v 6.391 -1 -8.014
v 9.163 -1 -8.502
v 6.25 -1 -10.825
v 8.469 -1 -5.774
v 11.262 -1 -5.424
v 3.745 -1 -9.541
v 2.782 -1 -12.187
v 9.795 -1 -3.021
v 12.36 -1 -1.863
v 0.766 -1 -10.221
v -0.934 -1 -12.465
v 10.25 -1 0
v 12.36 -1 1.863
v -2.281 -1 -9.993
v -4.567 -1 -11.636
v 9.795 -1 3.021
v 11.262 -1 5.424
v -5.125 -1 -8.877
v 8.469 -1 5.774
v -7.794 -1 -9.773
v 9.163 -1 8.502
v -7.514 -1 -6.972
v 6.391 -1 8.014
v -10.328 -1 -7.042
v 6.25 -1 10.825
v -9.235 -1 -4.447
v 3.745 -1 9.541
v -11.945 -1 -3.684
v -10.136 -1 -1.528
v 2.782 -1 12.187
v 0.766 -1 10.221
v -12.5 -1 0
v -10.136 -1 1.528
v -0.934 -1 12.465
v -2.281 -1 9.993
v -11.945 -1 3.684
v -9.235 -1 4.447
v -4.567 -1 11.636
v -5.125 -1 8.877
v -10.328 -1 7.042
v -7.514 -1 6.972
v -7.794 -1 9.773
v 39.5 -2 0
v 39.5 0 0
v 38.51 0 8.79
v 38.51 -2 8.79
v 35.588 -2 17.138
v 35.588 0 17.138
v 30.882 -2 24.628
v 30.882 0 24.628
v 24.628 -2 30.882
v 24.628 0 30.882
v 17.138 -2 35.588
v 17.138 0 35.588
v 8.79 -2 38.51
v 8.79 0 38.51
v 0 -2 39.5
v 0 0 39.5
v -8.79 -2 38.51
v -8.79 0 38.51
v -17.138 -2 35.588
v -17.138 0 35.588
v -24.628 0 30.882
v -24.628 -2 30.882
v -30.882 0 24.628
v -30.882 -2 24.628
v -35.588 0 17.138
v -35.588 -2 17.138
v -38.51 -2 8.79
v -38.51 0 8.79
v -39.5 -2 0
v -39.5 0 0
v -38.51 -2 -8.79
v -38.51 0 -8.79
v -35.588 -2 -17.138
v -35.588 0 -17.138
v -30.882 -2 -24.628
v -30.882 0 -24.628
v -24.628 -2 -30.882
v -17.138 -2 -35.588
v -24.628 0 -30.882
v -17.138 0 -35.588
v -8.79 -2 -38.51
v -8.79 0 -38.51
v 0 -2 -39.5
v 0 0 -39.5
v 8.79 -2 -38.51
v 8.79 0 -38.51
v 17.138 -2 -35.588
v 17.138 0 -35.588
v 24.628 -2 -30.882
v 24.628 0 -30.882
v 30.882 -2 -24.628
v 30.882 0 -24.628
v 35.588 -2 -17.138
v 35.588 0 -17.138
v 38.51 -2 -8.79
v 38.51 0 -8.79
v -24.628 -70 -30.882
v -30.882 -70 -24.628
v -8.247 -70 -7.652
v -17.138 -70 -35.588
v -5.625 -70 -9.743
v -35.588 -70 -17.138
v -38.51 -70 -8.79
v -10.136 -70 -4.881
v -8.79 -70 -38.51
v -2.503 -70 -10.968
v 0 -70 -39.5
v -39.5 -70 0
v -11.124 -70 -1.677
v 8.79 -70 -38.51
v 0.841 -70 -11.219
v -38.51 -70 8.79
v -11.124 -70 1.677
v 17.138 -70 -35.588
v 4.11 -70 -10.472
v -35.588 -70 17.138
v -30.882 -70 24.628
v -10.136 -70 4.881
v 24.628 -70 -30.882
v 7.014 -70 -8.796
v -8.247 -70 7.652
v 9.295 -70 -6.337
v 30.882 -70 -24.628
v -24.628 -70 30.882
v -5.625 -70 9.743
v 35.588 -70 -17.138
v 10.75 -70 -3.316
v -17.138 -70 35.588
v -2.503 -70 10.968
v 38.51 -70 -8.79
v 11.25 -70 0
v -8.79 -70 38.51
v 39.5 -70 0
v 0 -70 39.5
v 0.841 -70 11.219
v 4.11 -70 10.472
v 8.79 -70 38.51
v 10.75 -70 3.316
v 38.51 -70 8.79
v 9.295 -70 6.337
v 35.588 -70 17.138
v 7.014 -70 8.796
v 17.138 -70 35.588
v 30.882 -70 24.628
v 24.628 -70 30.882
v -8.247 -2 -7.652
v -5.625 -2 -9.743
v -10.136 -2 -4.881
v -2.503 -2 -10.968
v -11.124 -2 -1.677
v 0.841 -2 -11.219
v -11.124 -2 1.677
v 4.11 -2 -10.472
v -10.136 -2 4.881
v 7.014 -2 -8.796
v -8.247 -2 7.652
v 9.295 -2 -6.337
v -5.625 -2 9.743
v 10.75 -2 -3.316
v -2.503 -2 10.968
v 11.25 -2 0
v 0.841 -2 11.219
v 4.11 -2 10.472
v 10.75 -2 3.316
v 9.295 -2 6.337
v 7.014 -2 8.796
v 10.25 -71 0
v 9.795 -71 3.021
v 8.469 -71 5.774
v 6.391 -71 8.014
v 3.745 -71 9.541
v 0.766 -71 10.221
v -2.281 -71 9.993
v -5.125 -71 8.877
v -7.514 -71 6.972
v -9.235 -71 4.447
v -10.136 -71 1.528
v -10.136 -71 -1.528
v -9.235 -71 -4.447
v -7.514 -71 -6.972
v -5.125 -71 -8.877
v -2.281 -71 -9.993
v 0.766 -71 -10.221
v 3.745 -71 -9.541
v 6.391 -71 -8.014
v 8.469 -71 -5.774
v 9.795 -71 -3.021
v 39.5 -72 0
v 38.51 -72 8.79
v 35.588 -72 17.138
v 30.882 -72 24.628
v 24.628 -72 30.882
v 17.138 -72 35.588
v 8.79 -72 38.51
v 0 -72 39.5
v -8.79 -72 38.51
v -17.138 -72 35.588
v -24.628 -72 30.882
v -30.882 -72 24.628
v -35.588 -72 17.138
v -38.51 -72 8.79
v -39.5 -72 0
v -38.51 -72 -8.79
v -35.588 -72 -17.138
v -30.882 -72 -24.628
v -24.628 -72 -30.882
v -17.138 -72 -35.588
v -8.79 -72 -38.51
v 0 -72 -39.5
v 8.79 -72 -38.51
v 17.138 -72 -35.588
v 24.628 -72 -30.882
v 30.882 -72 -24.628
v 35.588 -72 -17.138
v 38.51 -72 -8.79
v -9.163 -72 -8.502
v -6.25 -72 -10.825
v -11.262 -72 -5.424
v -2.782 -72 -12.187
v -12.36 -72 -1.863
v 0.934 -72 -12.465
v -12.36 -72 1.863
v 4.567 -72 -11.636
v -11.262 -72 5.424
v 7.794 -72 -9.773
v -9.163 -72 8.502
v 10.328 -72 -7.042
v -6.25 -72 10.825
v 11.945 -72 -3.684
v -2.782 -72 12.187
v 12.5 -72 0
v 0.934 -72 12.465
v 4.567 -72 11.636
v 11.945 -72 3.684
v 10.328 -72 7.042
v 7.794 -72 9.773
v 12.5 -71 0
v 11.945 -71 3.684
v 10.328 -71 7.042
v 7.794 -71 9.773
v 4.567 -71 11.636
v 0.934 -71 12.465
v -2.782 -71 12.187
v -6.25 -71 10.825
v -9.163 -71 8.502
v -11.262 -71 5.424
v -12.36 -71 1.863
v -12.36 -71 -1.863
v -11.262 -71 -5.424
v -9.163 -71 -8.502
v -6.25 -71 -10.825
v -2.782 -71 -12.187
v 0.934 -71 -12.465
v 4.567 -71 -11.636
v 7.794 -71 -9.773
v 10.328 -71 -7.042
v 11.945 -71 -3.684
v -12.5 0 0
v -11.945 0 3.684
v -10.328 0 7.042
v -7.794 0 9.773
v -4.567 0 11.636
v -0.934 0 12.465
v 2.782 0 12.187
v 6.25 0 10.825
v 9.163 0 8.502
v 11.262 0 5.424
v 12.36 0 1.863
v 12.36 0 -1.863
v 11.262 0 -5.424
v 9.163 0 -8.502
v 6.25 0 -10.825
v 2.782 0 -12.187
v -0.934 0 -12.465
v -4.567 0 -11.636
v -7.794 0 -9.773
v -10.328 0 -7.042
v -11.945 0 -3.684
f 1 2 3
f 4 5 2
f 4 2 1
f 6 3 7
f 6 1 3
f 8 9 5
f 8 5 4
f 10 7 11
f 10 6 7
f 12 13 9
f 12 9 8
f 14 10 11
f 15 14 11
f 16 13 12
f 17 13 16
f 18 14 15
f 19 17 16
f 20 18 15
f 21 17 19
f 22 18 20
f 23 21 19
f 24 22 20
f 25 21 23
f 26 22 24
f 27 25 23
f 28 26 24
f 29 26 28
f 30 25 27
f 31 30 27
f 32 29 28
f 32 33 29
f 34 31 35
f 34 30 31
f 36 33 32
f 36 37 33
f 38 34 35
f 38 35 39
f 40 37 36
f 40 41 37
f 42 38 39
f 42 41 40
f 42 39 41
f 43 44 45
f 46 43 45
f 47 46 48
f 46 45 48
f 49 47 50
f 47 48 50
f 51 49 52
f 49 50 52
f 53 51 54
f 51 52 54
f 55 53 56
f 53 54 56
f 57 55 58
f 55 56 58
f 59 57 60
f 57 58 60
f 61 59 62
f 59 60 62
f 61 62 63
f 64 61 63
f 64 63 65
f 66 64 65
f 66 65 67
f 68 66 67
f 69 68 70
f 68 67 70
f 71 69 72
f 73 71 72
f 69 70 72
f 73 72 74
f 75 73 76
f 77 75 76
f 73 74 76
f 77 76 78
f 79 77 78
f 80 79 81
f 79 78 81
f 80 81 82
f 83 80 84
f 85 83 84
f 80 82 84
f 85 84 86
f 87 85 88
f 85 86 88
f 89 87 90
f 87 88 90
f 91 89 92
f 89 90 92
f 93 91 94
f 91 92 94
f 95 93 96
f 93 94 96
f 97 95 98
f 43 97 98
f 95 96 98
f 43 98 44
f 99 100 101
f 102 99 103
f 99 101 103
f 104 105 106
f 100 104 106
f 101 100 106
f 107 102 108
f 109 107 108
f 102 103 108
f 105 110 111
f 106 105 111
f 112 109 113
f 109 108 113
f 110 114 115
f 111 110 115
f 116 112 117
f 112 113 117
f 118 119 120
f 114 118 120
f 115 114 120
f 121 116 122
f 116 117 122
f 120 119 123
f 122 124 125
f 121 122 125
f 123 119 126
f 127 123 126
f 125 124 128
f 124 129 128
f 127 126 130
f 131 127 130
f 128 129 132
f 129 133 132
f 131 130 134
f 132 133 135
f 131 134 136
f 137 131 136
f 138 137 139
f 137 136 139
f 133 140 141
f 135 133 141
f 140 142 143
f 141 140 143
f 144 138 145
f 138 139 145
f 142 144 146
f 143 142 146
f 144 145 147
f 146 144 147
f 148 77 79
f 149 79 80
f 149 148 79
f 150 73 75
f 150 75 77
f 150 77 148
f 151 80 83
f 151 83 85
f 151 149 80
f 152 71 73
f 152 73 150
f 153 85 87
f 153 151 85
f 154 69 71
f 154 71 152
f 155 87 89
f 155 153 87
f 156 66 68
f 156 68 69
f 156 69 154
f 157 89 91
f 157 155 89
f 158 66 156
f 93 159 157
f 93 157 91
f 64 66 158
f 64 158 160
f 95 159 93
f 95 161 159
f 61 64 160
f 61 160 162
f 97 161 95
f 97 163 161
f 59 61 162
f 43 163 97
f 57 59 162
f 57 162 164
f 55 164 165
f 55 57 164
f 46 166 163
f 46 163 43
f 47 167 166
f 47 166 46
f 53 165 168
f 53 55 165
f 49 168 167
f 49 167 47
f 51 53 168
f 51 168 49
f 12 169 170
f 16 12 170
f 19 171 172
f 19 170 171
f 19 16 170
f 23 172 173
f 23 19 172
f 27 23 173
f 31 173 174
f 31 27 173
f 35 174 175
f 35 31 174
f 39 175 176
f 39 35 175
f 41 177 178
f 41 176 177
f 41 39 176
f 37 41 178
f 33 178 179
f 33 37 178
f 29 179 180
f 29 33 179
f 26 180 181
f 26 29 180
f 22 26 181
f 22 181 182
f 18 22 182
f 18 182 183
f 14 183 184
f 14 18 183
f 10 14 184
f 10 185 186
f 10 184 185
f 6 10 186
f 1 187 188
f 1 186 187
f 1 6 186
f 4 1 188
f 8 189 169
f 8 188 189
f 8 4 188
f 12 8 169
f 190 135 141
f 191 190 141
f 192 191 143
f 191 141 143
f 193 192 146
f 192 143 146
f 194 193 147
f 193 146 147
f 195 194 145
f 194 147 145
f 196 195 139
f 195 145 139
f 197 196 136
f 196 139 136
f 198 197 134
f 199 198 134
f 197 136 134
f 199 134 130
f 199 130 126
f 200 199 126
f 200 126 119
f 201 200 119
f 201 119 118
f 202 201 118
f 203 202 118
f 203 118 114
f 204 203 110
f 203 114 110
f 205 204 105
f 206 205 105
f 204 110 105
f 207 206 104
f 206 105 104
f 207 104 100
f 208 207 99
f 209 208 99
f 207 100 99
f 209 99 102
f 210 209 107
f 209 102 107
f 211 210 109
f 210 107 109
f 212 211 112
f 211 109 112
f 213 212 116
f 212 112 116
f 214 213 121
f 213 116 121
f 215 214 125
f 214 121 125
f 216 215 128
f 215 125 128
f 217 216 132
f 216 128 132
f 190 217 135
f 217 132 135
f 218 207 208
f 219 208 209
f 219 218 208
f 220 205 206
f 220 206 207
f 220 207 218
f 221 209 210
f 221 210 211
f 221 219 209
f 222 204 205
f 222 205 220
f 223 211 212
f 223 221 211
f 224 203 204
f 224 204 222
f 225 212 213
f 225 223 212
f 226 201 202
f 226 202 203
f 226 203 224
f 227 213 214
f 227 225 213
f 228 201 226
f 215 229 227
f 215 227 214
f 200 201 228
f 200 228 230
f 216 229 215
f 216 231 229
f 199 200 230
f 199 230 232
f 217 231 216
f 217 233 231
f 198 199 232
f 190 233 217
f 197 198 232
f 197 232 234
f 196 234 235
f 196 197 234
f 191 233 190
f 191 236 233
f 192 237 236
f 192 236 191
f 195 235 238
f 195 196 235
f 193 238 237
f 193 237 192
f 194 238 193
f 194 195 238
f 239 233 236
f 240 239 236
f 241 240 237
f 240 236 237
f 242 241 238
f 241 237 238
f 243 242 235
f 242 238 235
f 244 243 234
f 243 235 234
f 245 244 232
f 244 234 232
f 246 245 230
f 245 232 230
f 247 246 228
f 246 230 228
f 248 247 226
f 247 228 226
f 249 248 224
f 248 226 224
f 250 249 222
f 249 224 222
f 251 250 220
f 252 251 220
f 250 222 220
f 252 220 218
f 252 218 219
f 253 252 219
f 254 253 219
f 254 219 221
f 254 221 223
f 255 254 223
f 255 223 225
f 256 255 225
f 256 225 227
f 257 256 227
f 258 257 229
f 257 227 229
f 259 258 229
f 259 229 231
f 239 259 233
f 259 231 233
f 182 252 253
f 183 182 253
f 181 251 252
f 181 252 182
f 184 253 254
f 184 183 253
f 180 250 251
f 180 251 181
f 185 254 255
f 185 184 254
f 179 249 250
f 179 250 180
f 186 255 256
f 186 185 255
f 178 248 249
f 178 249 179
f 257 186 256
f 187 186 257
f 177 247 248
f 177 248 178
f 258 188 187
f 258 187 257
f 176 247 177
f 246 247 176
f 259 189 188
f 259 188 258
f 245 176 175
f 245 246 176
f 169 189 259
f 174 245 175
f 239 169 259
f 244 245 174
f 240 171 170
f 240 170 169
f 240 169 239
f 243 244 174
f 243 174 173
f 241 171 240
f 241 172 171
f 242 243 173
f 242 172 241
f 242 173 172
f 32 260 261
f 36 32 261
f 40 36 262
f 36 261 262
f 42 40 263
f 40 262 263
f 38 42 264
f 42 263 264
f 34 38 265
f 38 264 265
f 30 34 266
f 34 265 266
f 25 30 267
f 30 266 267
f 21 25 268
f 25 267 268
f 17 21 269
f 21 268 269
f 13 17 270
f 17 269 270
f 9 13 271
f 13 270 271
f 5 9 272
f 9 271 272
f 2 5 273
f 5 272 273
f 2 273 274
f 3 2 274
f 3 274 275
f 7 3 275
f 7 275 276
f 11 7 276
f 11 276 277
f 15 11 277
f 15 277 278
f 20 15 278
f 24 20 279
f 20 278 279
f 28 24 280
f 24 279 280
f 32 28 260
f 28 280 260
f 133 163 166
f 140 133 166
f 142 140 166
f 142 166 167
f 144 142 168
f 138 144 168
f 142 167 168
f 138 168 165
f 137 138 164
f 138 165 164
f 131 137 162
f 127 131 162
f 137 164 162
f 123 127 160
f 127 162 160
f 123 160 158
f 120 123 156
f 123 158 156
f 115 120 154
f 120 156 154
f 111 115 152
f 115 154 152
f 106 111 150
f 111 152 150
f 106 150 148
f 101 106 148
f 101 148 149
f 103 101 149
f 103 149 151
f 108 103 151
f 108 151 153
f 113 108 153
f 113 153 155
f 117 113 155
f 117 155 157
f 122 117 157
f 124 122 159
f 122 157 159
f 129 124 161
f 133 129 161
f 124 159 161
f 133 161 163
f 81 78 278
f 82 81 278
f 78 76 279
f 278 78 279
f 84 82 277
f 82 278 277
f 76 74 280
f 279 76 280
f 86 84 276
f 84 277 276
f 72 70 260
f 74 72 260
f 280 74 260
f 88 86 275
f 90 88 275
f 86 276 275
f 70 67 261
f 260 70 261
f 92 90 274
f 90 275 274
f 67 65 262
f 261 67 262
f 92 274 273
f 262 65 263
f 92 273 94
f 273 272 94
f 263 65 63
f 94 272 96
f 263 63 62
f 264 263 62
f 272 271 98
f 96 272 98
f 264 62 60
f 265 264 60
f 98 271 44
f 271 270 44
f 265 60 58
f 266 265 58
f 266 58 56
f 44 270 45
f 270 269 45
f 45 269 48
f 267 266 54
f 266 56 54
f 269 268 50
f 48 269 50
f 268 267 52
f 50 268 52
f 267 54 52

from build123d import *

# Parameters (mm, degrees)
F0_R     = 39.5
F0_R_2   = 10.25
F1_DEPTH = 2
F2_R     = 11.25
F2_R_2   = 10.25
F3_DEPTH = 68
F4_R     = 12.5
F5_DEPTH = 1
F6_R     = 39.5
F6_R_2   = 10.25
F7_DEPTH = 2
F8_R     = 12.5
F9_DEPTH = 1


with BuildPart() as f1:
    # F0 (on Front) → F1 (new body)
    with BuildSketch(Plane.XZ):
        Circle(F0_R)
        Circle(F0_R_2, mode=Mode.SUBTRACT)
    extrude(amount=F1_DEPTH)

    # F2 (on face) → F3 (join)
    with BuildSketch(Plane.XZ.offset(2)):
        Circle(F2_R)
        Circle(F2_R_2, mode=Mode.SUBTRACT)
    extrude(amount=F3_DEPTH)

    # F4 (on face) → F5 (cut)
    with BuildSketch(Plane(origin=(0, 0, 0), x_dir=(-1, 0, 0), z_dir=(0, 1, 0))):
        Circle(F4_R)
    extrude(amount=-F5_DEPTH, mode=Mode.SUBTRACT)

    # F6 (on face) → F7 (join)
    with BuildSketch(Plane.XZ.offset(70)):
        Circle(F6_R)
        Circle(F6_R_2, mode=Mode.SUBTRACT)
    extrude(amount=F7_DEPTH)

    # F8 (on face) → F9 (cut)
    with BuildSketch(Plane.XZ.offset(72)):
        Circle(F8_R)
    extrude(amount=-F9_DEPTH, mode=Mode.SUBTRACT)


solid = f1.part
